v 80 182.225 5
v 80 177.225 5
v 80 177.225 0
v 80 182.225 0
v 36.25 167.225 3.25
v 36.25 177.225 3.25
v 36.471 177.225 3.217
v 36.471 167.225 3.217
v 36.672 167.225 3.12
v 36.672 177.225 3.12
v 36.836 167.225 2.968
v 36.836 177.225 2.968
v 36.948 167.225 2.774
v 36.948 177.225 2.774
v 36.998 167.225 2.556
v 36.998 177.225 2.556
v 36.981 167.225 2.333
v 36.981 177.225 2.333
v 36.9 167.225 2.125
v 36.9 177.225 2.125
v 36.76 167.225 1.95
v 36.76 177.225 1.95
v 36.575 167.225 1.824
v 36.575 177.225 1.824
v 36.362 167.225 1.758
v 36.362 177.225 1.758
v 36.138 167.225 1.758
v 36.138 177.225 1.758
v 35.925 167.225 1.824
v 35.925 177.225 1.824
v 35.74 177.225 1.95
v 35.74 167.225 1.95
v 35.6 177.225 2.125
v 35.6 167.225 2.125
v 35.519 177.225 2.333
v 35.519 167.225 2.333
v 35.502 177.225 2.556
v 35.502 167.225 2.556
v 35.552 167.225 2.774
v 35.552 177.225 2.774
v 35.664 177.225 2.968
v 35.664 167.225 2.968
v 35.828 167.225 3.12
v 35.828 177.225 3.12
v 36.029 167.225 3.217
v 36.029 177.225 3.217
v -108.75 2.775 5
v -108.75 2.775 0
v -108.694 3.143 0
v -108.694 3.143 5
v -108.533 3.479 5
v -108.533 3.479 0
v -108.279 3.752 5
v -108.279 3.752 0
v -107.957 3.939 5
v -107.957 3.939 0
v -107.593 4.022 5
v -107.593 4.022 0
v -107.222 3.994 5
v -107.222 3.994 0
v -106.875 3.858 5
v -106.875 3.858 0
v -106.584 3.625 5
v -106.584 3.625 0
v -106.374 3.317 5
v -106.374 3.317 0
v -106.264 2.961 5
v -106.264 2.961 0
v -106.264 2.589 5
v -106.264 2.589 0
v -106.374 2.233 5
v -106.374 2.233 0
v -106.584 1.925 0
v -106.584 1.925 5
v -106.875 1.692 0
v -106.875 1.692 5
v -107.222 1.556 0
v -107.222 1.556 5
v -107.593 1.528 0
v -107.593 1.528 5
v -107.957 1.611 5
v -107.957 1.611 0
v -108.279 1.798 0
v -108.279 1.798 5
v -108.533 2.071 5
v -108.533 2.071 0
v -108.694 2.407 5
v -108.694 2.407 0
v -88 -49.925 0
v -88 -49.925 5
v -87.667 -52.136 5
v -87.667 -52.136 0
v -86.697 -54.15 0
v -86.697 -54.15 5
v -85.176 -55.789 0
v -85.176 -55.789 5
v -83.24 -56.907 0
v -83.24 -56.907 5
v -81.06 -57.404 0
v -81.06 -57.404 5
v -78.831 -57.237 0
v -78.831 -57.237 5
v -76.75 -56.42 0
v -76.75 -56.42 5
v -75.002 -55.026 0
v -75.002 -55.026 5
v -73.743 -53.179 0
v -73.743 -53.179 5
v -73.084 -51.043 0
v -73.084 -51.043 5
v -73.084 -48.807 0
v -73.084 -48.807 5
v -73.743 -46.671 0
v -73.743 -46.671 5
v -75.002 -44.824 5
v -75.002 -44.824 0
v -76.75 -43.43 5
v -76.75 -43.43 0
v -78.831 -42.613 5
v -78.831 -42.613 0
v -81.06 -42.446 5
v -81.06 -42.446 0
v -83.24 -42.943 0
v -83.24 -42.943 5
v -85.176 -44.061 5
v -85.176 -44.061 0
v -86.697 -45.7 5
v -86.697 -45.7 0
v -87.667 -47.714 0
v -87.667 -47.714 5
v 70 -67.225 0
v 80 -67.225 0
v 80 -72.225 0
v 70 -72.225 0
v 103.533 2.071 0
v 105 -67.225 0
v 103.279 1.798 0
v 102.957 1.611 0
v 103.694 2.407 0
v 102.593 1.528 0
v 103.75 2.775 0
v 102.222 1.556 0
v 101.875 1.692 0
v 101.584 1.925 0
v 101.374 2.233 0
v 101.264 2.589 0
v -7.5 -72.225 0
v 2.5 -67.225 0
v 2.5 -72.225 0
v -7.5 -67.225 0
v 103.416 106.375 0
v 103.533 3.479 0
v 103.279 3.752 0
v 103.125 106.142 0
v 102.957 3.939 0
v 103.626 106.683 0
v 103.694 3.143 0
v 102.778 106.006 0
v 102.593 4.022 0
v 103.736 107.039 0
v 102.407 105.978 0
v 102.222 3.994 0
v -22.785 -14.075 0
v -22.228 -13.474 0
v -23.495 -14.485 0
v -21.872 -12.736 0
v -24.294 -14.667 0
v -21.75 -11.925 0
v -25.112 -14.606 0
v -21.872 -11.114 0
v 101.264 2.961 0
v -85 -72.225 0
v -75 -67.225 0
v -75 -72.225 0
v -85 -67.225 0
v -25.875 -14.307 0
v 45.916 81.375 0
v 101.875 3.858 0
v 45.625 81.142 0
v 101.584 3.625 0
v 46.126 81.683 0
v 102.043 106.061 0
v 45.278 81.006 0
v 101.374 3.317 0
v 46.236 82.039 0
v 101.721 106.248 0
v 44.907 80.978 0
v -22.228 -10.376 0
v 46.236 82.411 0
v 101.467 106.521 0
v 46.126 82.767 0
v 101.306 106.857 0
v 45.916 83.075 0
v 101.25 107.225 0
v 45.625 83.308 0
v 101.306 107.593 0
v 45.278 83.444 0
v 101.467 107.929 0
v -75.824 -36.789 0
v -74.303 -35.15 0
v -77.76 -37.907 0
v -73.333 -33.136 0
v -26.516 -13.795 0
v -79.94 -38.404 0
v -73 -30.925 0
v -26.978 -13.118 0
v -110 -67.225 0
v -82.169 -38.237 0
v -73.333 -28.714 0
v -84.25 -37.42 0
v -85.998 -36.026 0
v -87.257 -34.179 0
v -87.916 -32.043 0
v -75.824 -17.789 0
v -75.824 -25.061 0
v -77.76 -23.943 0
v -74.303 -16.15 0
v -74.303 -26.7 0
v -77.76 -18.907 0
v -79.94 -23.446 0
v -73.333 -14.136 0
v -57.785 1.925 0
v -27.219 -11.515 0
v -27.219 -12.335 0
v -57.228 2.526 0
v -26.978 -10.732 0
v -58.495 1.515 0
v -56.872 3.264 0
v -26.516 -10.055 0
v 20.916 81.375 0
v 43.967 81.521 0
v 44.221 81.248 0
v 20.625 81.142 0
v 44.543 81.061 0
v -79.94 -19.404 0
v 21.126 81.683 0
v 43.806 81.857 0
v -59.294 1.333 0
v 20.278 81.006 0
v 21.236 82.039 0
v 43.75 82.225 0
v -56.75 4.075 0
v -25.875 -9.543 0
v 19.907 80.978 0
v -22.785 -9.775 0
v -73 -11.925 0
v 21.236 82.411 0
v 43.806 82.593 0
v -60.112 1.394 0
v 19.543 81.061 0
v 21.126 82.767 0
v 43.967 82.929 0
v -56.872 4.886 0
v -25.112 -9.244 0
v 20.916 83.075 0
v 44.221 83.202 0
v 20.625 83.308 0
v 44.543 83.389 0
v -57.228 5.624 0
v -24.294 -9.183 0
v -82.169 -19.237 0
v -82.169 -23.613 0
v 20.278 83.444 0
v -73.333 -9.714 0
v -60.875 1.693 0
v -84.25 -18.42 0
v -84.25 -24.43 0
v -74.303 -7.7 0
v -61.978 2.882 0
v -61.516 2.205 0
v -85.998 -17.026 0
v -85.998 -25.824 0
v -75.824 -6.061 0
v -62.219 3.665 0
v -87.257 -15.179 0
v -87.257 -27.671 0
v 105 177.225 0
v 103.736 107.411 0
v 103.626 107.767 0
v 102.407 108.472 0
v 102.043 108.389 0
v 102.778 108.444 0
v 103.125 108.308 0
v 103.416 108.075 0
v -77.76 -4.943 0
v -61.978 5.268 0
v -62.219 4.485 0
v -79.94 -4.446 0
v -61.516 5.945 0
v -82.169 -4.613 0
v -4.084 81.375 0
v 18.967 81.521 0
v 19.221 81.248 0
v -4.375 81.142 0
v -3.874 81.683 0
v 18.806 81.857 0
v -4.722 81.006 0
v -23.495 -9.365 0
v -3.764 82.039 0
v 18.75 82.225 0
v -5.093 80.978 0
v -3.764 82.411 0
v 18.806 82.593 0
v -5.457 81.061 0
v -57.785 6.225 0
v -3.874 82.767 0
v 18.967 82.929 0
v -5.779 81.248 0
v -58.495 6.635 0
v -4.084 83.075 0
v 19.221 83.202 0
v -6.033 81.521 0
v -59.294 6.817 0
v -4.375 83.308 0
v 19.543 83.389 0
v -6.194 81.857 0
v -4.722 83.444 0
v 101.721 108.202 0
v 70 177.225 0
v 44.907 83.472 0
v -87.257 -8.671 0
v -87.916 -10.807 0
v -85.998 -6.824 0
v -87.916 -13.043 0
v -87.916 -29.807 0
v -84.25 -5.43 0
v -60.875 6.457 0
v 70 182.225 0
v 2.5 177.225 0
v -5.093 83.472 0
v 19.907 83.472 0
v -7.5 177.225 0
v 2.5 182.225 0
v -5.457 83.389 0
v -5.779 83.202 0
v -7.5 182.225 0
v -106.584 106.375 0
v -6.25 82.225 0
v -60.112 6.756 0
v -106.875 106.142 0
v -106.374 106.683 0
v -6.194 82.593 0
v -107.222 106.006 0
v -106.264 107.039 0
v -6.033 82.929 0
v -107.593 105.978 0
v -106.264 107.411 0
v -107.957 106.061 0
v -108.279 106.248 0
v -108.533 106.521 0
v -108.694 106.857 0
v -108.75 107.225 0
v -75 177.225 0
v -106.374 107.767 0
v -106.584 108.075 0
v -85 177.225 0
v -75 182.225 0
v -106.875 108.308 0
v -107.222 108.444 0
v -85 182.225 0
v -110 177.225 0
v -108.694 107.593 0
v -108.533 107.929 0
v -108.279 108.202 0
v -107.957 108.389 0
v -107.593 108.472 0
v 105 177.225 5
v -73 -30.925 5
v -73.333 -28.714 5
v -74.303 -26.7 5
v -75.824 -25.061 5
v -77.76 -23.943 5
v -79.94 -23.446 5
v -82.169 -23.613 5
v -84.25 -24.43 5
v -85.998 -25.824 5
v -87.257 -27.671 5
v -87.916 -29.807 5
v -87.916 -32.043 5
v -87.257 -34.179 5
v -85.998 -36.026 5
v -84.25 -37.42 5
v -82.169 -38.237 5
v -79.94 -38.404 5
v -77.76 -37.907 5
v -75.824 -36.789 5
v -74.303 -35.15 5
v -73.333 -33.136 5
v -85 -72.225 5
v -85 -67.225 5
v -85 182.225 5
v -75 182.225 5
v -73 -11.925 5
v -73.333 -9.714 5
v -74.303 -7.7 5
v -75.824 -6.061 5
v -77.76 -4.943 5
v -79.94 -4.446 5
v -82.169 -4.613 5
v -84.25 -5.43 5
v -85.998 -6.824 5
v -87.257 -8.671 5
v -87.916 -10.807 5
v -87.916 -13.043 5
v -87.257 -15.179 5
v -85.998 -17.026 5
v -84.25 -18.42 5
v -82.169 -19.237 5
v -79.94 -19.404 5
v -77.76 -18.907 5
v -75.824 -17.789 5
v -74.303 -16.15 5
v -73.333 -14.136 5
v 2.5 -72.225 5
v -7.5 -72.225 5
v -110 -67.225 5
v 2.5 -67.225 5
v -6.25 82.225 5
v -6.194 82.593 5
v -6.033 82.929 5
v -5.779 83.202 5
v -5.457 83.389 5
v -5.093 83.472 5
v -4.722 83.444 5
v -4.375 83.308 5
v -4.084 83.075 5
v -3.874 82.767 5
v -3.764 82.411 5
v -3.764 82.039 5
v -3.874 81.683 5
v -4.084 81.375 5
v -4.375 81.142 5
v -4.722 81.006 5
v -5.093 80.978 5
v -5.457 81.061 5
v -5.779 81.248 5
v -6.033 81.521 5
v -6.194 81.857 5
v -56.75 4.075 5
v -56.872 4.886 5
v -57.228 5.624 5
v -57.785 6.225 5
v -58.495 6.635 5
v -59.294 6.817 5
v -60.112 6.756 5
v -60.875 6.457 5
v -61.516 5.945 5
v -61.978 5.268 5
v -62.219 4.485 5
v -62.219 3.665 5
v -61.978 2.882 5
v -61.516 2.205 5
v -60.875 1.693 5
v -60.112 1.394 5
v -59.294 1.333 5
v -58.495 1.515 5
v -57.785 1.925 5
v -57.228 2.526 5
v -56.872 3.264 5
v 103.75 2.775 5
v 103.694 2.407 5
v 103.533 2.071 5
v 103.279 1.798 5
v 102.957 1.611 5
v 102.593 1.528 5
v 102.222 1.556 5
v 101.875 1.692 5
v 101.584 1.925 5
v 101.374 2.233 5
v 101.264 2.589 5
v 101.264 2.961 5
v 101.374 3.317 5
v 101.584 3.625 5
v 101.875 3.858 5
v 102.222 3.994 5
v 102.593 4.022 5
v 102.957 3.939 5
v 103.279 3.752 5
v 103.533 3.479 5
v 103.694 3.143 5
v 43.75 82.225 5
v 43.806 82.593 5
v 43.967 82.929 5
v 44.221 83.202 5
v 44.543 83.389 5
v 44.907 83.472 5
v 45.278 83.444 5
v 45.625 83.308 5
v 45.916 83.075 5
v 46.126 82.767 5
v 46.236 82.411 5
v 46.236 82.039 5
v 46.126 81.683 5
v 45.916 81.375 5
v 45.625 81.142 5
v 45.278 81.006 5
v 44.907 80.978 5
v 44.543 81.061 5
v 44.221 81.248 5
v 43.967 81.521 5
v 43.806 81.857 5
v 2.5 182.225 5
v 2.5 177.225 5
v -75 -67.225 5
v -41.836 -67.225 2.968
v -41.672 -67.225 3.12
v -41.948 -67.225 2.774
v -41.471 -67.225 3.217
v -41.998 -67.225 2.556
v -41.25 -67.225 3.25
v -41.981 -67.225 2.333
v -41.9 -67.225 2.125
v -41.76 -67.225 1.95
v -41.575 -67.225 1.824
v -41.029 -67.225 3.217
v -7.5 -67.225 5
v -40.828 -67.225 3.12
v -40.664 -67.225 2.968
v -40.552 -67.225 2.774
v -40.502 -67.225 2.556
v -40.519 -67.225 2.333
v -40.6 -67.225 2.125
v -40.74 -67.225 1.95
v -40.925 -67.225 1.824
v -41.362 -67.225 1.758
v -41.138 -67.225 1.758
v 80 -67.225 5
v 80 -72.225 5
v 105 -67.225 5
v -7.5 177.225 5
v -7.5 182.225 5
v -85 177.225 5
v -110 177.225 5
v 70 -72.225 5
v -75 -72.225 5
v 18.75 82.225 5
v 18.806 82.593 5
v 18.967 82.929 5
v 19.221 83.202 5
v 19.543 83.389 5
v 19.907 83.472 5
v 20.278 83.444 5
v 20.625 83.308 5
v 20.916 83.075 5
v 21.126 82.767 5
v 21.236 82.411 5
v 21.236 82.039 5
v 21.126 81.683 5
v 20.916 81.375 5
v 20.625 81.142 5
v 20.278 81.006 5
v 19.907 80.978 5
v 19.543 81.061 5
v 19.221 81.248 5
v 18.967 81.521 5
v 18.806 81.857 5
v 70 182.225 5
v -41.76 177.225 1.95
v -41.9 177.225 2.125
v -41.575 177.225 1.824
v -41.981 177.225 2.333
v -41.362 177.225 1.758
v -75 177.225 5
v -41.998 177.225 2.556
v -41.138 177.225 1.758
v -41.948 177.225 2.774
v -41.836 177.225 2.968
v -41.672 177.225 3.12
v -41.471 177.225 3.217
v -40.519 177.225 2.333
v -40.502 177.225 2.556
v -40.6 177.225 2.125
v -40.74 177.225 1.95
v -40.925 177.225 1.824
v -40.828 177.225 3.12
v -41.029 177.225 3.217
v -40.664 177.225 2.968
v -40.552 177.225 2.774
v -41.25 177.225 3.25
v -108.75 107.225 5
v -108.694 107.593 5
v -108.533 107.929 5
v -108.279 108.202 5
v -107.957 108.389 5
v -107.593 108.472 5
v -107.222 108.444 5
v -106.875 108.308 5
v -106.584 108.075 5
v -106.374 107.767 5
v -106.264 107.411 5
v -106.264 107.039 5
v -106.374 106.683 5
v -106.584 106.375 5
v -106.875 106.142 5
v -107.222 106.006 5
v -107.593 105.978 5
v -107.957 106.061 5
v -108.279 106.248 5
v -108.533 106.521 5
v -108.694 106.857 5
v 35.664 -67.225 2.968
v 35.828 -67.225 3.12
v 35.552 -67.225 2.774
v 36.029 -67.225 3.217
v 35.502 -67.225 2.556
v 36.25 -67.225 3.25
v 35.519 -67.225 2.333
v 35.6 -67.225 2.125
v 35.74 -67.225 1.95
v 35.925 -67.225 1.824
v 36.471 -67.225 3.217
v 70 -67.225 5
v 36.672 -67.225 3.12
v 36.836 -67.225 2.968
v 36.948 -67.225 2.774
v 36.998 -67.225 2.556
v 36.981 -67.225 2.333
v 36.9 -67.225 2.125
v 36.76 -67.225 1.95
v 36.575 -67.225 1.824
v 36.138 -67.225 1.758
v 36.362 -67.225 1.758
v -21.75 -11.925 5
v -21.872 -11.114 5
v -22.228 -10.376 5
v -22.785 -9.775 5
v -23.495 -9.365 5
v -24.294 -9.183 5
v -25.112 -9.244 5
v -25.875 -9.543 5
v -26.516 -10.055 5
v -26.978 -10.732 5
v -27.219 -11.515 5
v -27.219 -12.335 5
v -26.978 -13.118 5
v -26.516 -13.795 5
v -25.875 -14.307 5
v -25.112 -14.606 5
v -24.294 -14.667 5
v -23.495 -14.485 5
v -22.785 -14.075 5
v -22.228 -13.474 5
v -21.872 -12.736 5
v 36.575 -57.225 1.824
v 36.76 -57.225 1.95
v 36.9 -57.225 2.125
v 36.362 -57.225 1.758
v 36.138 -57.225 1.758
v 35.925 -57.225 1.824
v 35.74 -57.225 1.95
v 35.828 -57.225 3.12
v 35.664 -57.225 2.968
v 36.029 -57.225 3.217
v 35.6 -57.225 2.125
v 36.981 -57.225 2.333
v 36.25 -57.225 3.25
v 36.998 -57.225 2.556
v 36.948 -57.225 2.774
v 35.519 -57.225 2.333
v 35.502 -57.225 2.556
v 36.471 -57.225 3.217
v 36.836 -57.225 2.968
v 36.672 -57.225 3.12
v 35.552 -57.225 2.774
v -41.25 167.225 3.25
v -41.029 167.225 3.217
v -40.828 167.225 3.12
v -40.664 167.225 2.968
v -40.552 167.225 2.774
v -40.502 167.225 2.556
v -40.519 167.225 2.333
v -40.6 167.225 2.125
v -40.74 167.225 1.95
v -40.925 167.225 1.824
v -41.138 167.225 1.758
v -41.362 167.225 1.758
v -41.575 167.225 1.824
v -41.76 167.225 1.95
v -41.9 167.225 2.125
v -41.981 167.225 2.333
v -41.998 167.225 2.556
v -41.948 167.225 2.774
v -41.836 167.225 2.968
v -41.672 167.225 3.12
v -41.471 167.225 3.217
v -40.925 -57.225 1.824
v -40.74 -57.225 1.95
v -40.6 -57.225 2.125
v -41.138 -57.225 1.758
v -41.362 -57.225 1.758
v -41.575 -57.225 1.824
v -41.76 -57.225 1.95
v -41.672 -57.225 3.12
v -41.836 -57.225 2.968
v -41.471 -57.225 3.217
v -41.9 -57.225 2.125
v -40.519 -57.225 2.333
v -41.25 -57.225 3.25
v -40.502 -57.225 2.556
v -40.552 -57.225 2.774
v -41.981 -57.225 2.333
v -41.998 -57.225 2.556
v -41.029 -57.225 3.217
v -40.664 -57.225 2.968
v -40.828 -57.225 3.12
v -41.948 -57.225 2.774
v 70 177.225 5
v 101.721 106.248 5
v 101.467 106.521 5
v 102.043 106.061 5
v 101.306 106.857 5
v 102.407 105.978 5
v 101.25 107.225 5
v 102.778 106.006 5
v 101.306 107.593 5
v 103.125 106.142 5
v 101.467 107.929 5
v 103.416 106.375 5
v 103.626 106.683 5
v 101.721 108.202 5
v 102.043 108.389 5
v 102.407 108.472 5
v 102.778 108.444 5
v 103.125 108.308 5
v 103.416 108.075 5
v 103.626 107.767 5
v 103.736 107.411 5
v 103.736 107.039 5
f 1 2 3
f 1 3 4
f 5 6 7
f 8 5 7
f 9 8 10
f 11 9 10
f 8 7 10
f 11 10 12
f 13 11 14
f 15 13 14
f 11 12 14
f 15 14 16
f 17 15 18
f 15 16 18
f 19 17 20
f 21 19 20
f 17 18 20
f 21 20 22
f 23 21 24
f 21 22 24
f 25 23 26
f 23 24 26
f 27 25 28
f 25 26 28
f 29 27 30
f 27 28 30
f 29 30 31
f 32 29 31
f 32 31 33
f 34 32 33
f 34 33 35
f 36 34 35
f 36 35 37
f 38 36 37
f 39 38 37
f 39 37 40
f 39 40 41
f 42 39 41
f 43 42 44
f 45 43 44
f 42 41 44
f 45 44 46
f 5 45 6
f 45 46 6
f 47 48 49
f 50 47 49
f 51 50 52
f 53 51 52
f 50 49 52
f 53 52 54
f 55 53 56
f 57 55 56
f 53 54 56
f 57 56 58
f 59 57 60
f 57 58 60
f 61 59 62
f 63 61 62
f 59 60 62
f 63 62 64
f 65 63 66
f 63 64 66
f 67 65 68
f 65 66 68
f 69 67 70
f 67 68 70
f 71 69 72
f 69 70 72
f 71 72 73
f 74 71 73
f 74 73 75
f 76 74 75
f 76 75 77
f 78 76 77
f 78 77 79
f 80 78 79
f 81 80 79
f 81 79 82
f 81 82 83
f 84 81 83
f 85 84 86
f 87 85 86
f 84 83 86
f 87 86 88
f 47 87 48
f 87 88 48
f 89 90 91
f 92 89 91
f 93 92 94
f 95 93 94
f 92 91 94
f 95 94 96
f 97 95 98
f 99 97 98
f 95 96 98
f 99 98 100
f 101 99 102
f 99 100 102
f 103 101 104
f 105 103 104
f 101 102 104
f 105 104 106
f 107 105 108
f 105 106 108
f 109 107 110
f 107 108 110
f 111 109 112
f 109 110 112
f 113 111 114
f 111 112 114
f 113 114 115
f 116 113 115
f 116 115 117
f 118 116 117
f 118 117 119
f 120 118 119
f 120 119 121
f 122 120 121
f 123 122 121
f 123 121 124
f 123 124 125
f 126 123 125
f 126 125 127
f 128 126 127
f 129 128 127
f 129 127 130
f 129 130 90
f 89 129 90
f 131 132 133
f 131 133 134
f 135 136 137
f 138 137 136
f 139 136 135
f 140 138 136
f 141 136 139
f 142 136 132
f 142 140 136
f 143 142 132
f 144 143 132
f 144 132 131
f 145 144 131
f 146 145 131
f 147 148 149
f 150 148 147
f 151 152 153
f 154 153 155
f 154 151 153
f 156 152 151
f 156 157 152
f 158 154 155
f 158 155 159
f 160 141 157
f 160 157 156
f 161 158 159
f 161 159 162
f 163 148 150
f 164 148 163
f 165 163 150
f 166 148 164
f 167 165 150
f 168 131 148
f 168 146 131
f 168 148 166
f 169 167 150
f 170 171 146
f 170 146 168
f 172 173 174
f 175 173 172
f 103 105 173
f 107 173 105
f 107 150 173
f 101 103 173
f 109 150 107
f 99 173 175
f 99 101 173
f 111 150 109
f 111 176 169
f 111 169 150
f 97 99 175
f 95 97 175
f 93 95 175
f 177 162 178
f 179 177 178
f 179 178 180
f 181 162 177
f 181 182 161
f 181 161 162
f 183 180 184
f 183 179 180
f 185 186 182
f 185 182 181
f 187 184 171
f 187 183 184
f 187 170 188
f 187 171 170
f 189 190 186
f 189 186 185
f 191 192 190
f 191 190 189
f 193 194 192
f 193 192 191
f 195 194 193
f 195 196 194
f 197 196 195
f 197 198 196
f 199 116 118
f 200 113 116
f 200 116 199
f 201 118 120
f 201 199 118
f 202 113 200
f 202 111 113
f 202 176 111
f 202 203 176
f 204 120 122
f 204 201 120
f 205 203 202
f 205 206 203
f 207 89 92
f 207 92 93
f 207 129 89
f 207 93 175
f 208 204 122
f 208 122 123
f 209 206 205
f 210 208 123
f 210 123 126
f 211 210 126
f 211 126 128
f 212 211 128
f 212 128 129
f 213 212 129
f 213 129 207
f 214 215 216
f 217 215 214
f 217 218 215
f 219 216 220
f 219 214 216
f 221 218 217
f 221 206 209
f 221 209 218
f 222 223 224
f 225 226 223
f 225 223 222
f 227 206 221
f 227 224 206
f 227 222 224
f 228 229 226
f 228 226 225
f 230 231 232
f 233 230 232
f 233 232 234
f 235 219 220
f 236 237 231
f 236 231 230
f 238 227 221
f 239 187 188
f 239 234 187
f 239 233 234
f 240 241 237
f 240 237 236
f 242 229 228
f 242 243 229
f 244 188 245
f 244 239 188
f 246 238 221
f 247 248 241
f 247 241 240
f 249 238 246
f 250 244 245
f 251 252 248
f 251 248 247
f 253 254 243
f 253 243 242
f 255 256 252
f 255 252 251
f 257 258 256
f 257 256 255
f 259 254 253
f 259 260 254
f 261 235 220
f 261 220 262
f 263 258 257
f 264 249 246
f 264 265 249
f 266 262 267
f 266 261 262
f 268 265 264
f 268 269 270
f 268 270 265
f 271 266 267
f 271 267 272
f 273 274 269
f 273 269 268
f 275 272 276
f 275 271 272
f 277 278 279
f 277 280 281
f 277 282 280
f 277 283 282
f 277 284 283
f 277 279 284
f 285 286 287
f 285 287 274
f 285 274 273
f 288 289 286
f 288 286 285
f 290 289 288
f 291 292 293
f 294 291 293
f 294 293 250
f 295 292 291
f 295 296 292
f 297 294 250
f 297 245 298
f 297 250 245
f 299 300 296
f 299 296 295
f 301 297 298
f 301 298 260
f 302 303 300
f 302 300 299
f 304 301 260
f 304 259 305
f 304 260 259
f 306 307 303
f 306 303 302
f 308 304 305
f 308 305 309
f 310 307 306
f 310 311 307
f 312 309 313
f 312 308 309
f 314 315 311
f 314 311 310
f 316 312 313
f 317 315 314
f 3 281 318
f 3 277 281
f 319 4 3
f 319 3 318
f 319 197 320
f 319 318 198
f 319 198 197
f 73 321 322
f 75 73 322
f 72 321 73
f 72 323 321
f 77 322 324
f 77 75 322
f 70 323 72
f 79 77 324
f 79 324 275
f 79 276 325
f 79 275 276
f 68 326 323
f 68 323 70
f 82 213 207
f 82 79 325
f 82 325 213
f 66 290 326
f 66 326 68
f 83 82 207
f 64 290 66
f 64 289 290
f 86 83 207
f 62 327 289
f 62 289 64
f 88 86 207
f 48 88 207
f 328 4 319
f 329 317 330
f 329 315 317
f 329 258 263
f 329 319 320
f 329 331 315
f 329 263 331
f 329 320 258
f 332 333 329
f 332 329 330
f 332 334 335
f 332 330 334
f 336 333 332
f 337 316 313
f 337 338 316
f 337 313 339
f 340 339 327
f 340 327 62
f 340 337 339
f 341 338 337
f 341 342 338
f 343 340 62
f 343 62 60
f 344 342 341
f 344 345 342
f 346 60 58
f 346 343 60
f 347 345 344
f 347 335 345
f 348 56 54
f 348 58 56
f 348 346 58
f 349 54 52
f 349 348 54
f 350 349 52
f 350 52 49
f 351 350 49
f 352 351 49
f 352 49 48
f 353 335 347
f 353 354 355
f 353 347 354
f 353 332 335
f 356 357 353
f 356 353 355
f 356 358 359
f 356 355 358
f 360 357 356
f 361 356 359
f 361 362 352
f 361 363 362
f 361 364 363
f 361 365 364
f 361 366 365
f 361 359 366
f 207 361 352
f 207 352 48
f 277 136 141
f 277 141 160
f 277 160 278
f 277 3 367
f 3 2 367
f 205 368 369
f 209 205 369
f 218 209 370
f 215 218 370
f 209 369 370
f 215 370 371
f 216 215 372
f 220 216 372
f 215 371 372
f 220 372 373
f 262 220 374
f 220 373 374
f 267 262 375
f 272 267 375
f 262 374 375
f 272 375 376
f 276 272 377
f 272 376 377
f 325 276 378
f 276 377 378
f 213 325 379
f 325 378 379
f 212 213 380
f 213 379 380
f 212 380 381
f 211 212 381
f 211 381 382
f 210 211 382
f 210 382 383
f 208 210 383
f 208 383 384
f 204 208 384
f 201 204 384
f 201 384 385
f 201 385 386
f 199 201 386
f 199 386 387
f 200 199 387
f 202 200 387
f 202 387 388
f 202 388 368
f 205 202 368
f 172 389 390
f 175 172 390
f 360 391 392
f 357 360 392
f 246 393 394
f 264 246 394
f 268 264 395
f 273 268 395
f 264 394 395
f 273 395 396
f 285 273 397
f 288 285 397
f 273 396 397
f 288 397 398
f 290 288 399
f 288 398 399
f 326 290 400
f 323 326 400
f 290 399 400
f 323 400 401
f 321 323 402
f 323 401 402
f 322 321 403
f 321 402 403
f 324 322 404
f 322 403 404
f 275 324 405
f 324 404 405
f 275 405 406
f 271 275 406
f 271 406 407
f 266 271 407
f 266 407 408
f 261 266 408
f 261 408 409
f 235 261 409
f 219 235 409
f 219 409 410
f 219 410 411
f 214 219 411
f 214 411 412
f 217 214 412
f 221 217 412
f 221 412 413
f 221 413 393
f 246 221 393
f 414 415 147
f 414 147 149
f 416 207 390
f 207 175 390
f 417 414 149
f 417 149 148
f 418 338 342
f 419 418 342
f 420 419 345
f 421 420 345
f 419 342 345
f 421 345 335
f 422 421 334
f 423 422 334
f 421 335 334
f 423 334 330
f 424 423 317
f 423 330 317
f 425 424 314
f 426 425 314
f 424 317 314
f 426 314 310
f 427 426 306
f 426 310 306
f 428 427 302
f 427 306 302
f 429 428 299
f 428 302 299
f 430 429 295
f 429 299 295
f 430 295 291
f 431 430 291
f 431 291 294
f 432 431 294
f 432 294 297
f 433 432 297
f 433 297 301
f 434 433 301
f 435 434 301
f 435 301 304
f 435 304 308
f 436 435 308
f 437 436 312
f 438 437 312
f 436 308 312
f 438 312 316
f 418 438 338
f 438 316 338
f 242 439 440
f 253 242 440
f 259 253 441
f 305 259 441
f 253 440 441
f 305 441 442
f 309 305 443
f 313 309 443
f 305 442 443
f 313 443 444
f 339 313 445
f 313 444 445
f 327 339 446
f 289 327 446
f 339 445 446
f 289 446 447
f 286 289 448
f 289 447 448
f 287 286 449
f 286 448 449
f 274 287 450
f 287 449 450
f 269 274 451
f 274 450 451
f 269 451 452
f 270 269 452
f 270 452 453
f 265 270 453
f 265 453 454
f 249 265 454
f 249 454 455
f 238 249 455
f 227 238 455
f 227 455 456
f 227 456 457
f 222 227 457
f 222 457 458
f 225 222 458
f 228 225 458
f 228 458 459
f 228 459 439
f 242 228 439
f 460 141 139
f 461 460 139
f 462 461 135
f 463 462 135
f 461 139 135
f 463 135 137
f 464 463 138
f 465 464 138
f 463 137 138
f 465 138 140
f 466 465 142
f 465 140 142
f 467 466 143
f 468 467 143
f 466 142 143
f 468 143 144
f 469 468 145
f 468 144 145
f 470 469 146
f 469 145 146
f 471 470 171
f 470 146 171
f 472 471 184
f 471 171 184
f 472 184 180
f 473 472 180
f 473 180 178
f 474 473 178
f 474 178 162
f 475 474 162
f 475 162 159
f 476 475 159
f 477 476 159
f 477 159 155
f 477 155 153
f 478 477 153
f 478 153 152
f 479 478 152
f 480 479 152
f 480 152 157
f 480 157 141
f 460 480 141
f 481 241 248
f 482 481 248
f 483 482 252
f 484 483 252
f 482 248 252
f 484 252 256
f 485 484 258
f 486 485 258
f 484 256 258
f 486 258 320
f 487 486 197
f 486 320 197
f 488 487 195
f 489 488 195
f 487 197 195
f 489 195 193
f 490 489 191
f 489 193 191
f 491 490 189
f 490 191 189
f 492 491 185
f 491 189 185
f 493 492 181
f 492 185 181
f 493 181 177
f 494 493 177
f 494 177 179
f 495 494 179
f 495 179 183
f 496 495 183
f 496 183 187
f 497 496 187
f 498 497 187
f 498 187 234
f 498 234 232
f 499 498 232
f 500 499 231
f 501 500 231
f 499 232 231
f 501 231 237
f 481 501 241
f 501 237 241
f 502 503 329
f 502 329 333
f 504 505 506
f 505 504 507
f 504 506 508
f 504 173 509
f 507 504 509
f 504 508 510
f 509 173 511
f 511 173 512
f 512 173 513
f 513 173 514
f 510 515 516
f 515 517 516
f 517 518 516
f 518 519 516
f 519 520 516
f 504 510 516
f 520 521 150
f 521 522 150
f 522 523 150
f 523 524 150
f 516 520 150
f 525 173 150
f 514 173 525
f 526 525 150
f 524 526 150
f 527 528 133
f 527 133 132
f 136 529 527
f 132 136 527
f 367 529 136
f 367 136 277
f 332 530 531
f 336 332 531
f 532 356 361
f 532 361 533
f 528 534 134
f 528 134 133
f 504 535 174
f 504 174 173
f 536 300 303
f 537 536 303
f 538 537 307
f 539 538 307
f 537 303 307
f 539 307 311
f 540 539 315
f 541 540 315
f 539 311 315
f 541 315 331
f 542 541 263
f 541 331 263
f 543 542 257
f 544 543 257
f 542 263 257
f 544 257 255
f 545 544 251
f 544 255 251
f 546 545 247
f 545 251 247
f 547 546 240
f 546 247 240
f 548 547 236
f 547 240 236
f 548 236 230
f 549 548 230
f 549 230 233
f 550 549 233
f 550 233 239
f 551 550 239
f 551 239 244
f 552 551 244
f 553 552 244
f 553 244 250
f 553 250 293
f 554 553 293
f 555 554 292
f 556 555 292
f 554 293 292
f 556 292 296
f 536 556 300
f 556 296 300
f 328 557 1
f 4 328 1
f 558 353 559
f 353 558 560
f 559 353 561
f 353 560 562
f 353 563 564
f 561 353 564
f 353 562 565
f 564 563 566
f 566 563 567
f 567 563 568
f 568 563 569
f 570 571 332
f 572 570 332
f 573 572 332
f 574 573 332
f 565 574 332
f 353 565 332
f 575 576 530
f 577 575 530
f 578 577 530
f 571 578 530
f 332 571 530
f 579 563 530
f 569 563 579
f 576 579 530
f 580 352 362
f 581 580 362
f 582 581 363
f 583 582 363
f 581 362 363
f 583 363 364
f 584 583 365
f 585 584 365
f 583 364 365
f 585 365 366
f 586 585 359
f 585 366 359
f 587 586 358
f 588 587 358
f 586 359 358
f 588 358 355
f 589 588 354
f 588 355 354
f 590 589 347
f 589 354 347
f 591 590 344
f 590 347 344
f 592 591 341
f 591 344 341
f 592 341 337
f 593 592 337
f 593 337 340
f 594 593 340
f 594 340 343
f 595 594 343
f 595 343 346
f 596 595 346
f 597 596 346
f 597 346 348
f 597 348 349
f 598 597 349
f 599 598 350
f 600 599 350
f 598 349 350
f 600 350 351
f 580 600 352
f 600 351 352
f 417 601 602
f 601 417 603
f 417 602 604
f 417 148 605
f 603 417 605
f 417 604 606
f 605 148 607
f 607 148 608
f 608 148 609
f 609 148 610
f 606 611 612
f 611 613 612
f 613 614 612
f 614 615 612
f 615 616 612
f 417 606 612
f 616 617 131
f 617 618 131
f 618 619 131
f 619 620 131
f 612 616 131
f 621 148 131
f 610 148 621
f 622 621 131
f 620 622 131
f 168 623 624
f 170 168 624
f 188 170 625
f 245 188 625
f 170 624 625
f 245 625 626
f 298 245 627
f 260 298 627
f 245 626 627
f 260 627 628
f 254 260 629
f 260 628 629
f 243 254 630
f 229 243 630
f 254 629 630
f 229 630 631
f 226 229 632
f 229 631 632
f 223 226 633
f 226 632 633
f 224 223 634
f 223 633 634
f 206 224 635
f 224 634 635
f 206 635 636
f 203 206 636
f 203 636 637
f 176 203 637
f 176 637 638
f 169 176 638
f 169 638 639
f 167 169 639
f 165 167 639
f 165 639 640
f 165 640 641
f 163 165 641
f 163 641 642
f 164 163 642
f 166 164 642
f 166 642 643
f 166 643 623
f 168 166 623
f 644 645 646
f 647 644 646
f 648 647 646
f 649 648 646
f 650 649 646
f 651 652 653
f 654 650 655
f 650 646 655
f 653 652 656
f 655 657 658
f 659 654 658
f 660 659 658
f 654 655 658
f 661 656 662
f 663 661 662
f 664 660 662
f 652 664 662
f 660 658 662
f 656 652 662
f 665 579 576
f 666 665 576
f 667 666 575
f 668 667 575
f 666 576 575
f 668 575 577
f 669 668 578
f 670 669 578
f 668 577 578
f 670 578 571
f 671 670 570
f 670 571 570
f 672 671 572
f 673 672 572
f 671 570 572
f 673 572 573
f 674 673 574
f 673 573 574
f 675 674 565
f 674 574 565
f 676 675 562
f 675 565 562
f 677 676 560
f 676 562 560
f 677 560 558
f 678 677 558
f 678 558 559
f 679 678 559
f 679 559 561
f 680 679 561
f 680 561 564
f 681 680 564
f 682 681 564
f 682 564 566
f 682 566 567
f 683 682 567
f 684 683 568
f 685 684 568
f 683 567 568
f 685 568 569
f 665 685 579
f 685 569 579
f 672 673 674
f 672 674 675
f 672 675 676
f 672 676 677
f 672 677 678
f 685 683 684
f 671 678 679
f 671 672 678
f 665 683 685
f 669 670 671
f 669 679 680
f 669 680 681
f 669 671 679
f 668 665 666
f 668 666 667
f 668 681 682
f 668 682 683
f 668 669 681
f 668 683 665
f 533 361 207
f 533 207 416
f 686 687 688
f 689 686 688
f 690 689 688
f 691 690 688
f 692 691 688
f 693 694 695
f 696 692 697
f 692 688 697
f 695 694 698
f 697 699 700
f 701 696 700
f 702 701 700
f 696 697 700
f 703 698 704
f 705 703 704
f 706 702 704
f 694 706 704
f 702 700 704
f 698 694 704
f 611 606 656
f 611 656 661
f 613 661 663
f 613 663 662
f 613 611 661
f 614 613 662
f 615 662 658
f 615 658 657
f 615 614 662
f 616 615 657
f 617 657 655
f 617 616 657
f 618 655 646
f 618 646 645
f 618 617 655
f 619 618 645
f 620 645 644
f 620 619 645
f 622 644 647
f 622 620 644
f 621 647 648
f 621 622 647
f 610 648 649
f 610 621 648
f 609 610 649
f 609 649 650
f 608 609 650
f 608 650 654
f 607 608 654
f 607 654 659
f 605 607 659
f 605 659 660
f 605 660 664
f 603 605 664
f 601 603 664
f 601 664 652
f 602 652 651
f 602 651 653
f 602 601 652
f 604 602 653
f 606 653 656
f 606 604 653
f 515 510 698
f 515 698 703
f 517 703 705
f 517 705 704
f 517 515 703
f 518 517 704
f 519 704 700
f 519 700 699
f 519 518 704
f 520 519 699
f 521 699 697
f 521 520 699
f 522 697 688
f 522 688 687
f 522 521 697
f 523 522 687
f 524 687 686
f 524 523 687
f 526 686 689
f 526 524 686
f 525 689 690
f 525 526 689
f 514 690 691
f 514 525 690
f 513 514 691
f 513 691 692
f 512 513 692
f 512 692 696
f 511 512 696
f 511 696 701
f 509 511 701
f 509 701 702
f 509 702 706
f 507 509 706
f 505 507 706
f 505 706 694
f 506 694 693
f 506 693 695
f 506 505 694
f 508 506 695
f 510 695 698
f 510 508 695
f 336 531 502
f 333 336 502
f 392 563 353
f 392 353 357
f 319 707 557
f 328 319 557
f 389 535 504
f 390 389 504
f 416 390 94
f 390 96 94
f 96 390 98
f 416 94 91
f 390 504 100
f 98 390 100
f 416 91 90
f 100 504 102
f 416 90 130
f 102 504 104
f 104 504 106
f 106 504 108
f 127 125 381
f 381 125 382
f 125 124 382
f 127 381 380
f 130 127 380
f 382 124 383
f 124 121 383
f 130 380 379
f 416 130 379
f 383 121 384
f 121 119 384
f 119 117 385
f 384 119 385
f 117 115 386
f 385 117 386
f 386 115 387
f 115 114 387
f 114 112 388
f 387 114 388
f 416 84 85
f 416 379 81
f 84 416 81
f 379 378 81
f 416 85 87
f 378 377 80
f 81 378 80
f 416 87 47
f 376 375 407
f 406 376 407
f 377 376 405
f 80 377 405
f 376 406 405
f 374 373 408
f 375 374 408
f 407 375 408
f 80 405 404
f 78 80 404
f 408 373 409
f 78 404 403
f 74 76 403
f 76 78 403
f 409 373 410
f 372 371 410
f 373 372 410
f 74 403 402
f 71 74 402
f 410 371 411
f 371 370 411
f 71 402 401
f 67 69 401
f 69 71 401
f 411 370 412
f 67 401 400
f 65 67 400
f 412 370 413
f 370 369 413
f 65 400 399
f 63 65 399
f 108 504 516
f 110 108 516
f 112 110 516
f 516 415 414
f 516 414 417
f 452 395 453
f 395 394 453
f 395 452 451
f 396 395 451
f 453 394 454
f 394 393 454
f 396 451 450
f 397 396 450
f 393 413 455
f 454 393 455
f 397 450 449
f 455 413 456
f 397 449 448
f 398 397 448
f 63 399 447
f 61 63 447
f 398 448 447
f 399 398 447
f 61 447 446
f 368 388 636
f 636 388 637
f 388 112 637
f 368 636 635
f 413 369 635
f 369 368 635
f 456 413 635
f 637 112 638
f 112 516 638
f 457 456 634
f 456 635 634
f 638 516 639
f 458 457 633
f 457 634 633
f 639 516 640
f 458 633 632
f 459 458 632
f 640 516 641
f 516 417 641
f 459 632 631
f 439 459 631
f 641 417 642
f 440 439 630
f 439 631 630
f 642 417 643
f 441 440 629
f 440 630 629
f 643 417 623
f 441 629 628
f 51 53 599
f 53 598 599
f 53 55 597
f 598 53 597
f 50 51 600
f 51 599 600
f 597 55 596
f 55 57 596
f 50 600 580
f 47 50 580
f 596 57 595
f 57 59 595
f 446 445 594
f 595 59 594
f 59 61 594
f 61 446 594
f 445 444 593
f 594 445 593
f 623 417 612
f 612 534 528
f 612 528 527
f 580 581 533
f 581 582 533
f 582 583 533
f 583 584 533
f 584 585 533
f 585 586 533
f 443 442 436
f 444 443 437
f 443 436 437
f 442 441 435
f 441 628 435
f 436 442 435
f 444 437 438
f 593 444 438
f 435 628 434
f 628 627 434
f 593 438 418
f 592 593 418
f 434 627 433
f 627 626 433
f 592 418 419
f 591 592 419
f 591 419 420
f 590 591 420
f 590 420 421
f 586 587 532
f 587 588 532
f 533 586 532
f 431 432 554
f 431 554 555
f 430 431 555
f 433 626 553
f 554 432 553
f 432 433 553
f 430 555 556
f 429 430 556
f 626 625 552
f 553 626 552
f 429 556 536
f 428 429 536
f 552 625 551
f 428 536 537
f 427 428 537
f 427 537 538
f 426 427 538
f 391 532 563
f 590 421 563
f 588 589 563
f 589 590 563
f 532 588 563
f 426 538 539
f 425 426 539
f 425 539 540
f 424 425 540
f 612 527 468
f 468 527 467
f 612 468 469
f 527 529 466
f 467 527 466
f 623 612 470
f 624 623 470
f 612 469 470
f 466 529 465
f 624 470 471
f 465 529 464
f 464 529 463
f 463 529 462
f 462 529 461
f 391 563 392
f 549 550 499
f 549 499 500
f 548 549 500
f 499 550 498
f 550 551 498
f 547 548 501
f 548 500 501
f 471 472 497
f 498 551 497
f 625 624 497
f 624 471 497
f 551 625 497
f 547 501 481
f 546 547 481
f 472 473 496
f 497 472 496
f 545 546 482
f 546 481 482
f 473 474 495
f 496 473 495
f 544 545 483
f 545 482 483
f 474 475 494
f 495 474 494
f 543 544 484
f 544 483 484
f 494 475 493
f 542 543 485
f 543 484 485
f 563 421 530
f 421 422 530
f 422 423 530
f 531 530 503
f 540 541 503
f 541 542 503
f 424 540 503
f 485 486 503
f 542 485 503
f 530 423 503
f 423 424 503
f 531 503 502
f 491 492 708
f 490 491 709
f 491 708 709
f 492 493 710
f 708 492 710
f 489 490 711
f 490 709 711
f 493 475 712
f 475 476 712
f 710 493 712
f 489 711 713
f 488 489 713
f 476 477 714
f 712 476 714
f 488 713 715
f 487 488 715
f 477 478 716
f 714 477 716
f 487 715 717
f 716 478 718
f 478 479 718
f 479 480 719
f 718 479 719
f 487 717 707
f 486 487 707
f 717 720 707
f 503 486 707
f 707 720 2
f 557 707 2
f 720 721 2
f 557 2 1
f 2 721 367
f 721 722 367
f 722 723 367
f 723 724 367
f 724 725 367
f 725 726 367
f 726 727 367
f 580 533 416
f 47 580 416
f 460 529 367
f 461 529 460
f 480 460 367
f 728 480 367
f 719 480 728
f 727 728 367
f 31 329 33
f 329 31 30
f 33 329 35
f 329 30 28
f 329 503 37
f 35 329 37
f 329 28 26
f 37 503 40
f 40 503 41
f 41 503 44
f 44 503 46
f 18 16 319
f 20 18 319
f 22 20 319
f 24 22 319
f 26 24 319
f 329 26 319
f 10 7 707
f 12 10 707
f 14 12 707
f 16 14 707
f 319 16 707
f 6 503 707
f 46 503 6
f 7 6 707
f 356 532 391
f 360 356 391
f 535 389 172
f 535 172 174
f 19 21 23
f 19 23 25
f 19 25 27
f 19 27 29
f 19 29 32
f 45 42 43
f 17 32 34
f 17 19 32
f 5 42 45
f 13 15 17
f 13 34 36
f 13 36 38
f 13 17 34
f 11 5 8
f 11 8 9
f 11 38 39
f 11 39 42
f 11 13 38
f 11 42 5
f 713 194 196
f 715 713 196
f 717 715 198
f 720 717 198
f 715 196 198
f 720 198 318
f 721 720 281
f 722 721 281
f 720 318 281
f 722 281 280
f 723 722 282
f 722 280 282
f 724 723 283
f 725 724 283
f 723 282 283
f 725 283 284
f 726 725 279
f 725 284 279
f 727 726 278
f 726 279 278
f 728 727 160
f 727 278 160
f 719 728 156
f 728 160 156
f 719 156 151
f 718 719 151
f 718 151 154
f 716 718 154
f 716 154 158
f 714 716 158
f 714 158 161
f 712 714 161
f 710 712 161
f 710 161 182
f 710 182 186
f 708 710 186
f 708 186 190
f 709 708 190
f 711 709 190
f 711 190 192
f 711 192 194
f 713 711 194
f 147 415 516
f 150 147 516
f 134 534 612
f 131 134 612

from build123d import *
from build123d.topology import SkipClean

# Parameters (mm, degrees)
SKIZZE1_W                       = 5
SKIZZE1_H                       = 5
SKIZZE1_W_2                     = 15
AUFSATZ_LINEAR_AUSTRAGEN1_DEPTH = 5
SKIZZE2_R                       = 2.75
SCHNITT_LINEAR_AUSTRAGEN1_DEPTH = 128.539996178
SCHNITT_LINEAR_AUSTRAGEN2_DEPTH = 128.539996178
SKIZZE4_R                       = 7.5
SCHNITT_LINEAR_AUSTRAGEN3_DEPTH = 128.539996178
SKIZZE5_R                       = 0.75
SKIZZE5_R_2                     = 6
SENSORS_DEPTH                   = 128.539996178
AUFSATZ_LINEAR_AUSTRAGEN2_DEPTH = 5
SKIZZE7_R                       = 1.25
SCHNITT_LINEAR_AUSTRAGEN5_DEPTH = 239.81729549
SKETCH1_W                       = 69.5
SKETCH1_H                       = 110
BOSS_EXTRUDE1_DEPTH             = 5
SKIZZE9_R                       = 0.75
SKIZZE9_R_2                     = 6
DISCRETECHANNEL_DEPTH           = 239.81729549
SKIZZE10_R                      = 0.75
SKIZZE10_R_2                    = 6
CONTCHANNEL_DEPTH               = 239.81729549
BOSS_EXTRUDE2_DEPTH             = 5
SKIZZE8_R                       = 0.75
SKIZZE8_R_2                     = 7.5
STEPDOWNCONVERTER_DEPTH         = 239.81729549
SKETCH3_R                       = 0.75
SKETCH3_R_2                     = 5
BBB_DEPTH                       = 5
BOSS_EXTRUDE3_DEPTH             = 5
SKETCH5_W                       = 55
SKETCH5_H                       = 244.45
CUT_EXTRUDE2_DEPTH              = 5
SKETCH6_R                       = 5
CUT_EXTRUDE3_DEPTH              = 5
SKETCH7_W                       = 5
SKETCH7_H                       = 10
BOSS_EXTRUDE4_DEPTH             = 5
SKETCH8_W                       = 10
SKETCH8_H                       = 5
BOSS_EXTRUDE5_DEPTH             = 5
BOSS_EXTRUDE6_START             = -5
SKETCH9_W                       = 210
SKETCH9_H                       = 244.45
SKETCH9_R                       = 2.75
SKETCH9_R_2                     = 7.5
BOSS_EXTRUDE6_DEPTH             = 5
SKETCH10_R                      = 1.25
CUT_EXTRUDE4_DEPTH              = 5
SKETCH11_R                      = 1.25
CUT_EXTRUDE5_DEPTH              = 211.370983325
SKETCH12_R                      = 0.75
CUT_EXTRUDE6_DEPTH              = 10
SKETCH13_W                      = 5
SKETCH13_H                      = 244.45
BOSS_EXTRUDE7_DEPTH             = 5
SKETCH14_R                      = 1.25
CUT_EXTRUDE7_DEPTH              = 5
SKETCH15_R                      = 1.25
BOSS_EXTRUDE8_DEPTH             = 5


with BuildPart() as part:
    # Skizze1 → Aufsatz-Linear austragen1 (new body)
    with BuildSketch(Plane.XY):
        Polygon((55, 67.225), (75, 67.225), (75, 72.225), (85, 72.225), (85, 67.225), (100, 67.225), (100, 47.225), (105, 47.225), (105, 37.225), (100, 37.225), (100, -37.225), (105, -37.225), (105, -47.225), (100, -47.225), (100, -67.225), (-100, -67.225), (-100, -47.225), (-105, -47.225), (-105, -37.225), (-100, -37.225), (-100, 37.225), (-105, 37.225), (-105, 47.225), (-100, 47.225), (-100, 67.225), (-85, 67.225), (-85, 72.225), (-75, 72.225), (-75, 67.225), (45, 67.225), (45, 72.225), (55, 72.225), align=None)
        with Locations((13, -40.055)):
            Rectangle(SKIZZE1_W, SKIZZE1_H, mode=Mode.SUBTRACT)
        with Locations((53, -40.055)):
            Rectangle(SKIZZE1_W, SKIZZE1_H, mode=Mode.SUBTRACT)
        with Locations((33, -40.055)):
            Rectangle(SKIZZE1_W_2, SKIZZE1_H, mode=Mode.SUBTRACT)
    extrude(amount=AUFSATZ_LINEAR_AUSTRAGEN1_DEPTH)

    # Skizze2 → Schnitt-Linear austragen1 (cut, through all)
    with BuildSketch(Plane.XY.offset(5)):
        with Locations((-59.5, 4.075)):
            Circle(SKIZZE2_R)
        with Locations((-24.5, -11.925)):
            Circle(SKIZZE2_R)
    extrude(amount=-SCHNITT_LINEAR_AUSTRAGEN1_DEPTH, mode=Mode.SUBTRACT)

    # Skizze3 → Schnitt-Linear austragen2 (cut, through all)
    with BuildSketch(Plane.XY.offset(5)):
        with BuildLine():
            Line((25, -17.555), (41, -17.555))
            ThreePointArc((41, -17.555), (42.414213562, -18.140786438), (43, -19.555))
            Line((43, -19.555), (43, -35.555))
            ThreePointArc((43, -35.555), (42.414213562, -36.969213562), (41, -37.555))
            Line((41, -37.555), (37, -37.555))
            Line((37, -37.555), (29, -37.555))
            Line((29, -37.555), (25, -37.555))
            ThreePointArc((25, -37.555), (23.585786438, -36.969213562), (23, -35.555))
            Line((23, -35.555), (23, -19.555))
            ThreePointArc((23, -19.555), (23.585786438, -18.140786438), (25, -17.555))
        make_face()
        with BuildLine():
            Line((-66.5, 54.225), (-66.5, 35.225))
            ThreePointArc((-66.5, 35.225), (-67.378679656, 33.103679656), (-69.5, 32.225))
            Line((-69.5, 32.225), (-88.5, 32.225))
            ThreePointArc((-88.5, 32.225), (-90.621320344, 33.103679656), (-91.5, 35.225))
            Line((-91.5, 35.225), (-91.5, 54.225))
            ThreePointArc((-91.5, 54.225), (-90.621320344, 56.346320344), (-88.5, 57.225))
            Line((-88.5, 57.225), (-69.5, 57.225))
            ThreePointArc((-69.5, 57.225), (-67.378679656, 56.346320344), (-66.5, 54.225))
        make_face()
        with BuildLine():
            Line((4.5, 57.225), (-14.5, 57.225))
            ThreePointArc((-14.5, 57.225), (-16.621320344, 56.346320344), (-17.5, 54.225))
            Line((-17.5, 54.225), (-17.5, 35.225))
            ThreePointArc((-17.5, 35.225), (-16.621320344, 33.103679656), (-14.5, 32.225))
            Line((-14.5, 32.225), (4.5, 32.225))
            ThreePointArc((4.5, 32.225), (6.621320344, 33.103679656), (7.5, 35.225))
            Line((7.5, 35.225), (7.5, 54.225))
            ThreePointArc((7.5, 54.225), (6.621320344, 56.346320344), (4.5, 57.225))
        make_face()
    extrude(amount=-SCHNITT_LINEAR_AUSTRAGEN2_DEPTH, mode=Mode.SUBTRACT)

    # Skizze4 → Schnitt-Linear austragen3 (cut, through all)
    with BuildSketch(Plane.XY.offset(5)):
        with Locations((-80.5, -30.925)):
            Circle(SKIZZE4_R)
        with Locations((-80.5, -11.925)):
            Circle(SKIZZE4_R)
        with Locations(Location((-80.5, -49.925, 0), (0, 0, 180))):
            Circle(SKIZZE4_R)
    extrude(amount=-SCHNITT_LINEAR_AUSTRAGEN3_DEPTH, mode=Mode.SUBTRACT)

    # Skizze5 → Sensors (cut, through all)
    with BuildSketch(Plane.XY.offset(5)):
        with Locations((-8, -45.225)):
            Circle(SKIZZE5_R)
        with Locations((-8, -3.225)):
            Circle(SKIZZE5_R)
        with Locations((83, -12.225)):
            Circle(SKIZZE5_R)
        with Locations((-15, -56.225)):
            Circle(SKIZZE5_R_2)
        with Locations((0, -56.225)):
            Circle(SKIZZE5_R_2)
        with Locations((15, -56.225)):
            Circle(SKIZZE5_R_2)
        with Locations((30, -56.225)):
            Circle(SKIZZE5_R_2)
        with Locations((45, -56.225)):
            Circle(SKIZZE5_R_2)
        with Locations((60, -56.225)):
            Circle(SKIZZE5_R_2)
        with Locations((75, -56.225)):
            Circle(SKIZZE5_R_2)
        with Locations((90, -56.225)):
            Circle(SKIZZE5_R_2)
    extrude(amount=-SENSORS_DEPTH, mode=Mode.SUBTRACT)

    # Skizze6 → Aufsatz-Linear austragen2 (add)
    with BuildSketch(Plane(origin=(0, 0, 0), x_dir=(-1, 0, 0), z_dir=(0, 0, -1))):
        Polygon((160, 47.225), (160, 37.225), (160, -37.225), (160, -47.225), (160, -67.225), (100, -67.225), (100, 67.225), (-30.5, 67.225), (-30.5, 177.225), (160, 177.225), (160, 67.225), align=None)
    extrude(amount=-AUFSATZ_LINEAR_AUSTRAGEN2_DEPTH)

    # Skizze7 → Schnitt-Linear austragen5 (cut, through all)
    with BuildSketch(Plane(origin=(0, 0, 0), x_dir=(-1, 0, 0), z_dir=(0, 0, -1))):
        with Locations((71.5, 32.775)):
            Circle(SKIZZE7_R)
        with Locations((96.5, 32.775)):
            Circle(SKIZZE7_R)
        with Locations((46.5, 32.775)):
            Circle(SKIZZE7_R)
    extrude(amount=-SCHNITT_LINEAR_AUSTRAGEN5_DEPTH, mode=Mode.SUBTRACT)

    # Sketch1 → Boss-Extrude1 (add)
    with BuildSketch(Plane.XY.offset(5)):
        with Locations((65.25, 122.225)):
            Rectangle(SKETCH1_W, SKETCH1_H)
    extrude(amount=-BOSS_EXTRUDE1_DEPTH)

    # Skizze9 → DiscreteChannel (cut, through all)
    with BuildSketch(Plane.XY.offset(5)):
        with Locations((8, 71.515)):
            Circle(SKIZZE9_R)
        with Locations(Location((69, 71.515, 0), (0, 0, 180))):
            Circle(SKIZZE9_R)
        with Locations(Location((8, 10.515, 0), (0, 0, 180))):
            Circle(SKIZZE9_R)
        with Locations((69, 10.515)):
            Circle(SKIZZE9_R)
        with Locations((-2, 5.015)):
            Circle(SKIZZE9_R_2)
        with Locations((-2, 29.015)):
            Circle(SKIZZE9_R_2)
        with Locations((-2, 53.015)):
            Circle(SKIZZE9_R_2)
        with Locations((-2, 77.015)):
            Circle(SKIZZE9_R_2)
    extrude(amount=-DISCRETECHANNEL_DEPTH, mode=Mode.SUBTRACT)

    # Skizze10 → ContChannel (cut, through all)
    with BuildSketch(Plane.XY.offset(5)):
        with Locations((-4, 136.225)):
            Circle(SKIZZE10_R)
        with Locations(Location((-4, 94.225, 0), (0, 0, 180))):
            Circle(SKIZZE10_R)
        with Locations(Location((-96, 136.225, 0), (0, 0, 180))):
            Circle(SKIZZE10_R)
        with Locations((-96, 94.225)):
            Circle(SKIZZE10_R)
        with Locations((-72.499999267, 166.225)):
            Circle(SKIZZE10_R_2)
        with Locations((-57.499999267, 166.225)):
            Circle(SKIZZE10_R_2)
        with Locations((-42.499999267, 166.225)):
            Circle(SKIZZE10_R_2)
        with Locations((-27.499999267, 166.225)):
            Circle(SKIZZE10_R_2)
        with Locations((-27.499999267, 151.225)):
            Circle(SKIZZE10_R_2)
        with Locations((-42.499999267, 151.225)):
            Circle(SKIZZE10_R_2)
        with Locations((-57.499999267, 151.225)):
            Circle(SKIZZE10_R_2)
        with Locations((-72.499999267, 151.225)):
            Circle(SKIZZE10_R_2)
    extrude(amount=-CONTCHANNEL_DEPTH, mode=Mode.SUBTRACT)

    # Sketch2 → Boss-Extrude2 (add)
    with SkipClean():  # the faces are left unmerged after this step: merging them gives an invalid solid
        with BuildSketch(Plane.XY.offset(5)):
            with BuildLine():
                Line((-14.5, 32.225), (-7.069112348, 32.225))
                ThreePointArc((-7.069112348, 32.225), (-2, 35.015), (3.069112348, 32.225))
                Line((3.069112348, 32.225), (4.5, 32.225))
                ThreePointArc((4.5, 32.225), (6.621320344, 33.103679656), (7.5, 35.225))
                Line((7.5, 35.225), (7.5, 54.225))
                ThreePointArc((7.5, 54.225), (6.621320344, 56.346320344), (4.5, 57.225))
                Line((4.5, 57.225), (2.275032164, 57.225))
                ThreePointArc((2.275032164, 57.225), (-2, 47.015), (-6.275032164, 57.225))
                Line((-6.275032164, 57.225), (-14.5, 57.225))
                ThreePointArc((-14.5, 57.225), (-16.621320344, 56.346320344), (-17.5, 54.225))
                Line((-17.5, 54.225), (-17.5, 35.225))
                ThreePointArc((-17.5, 35.225), (-16.621320344, 33.103679656), (-14.5, 32.225))
            make_face()
        extrude(amount=-BOSS_EXTRUDE2_DEPTH)

    # Skizze8 → StepDownConverter (cut, through all)
    with SkipClean():  # the faces are left unmerged after this step: merging them gives an invalid solid
        with BuildSketch(Plane.XY.offset(5)):
            with Locations((62.5, 153.225)):
                Circle(SKIZZE8_R)
            with Locations(Location((93.5, 153.225, 0), (0, 0, 180))):
                Circle(SKIZZE8_R)
            with Locations(Location((62.5, 100.225, 0), (0, 0, 180))):
                Circle(SKIZZE8_R)
            with Locations((93.5, 100.225)):
                Circle(SKIZZE8_R)
            with Locations((78, 86.225)):
                Circle(SKIZZE8_R_2)
            with Locations(Location((78, 167.225, 0), (0, 0, 180))):
                Circle(SKIZZE8_R_2)
        extrude(amount=-STEPDOWNCONVERTER_DEPTH, mode=Mode.SUBTRACT)

    # Sketch3 → BBB (cut)
    with SkipClean():  # the faces are left unmerged after this step: merging them gives an invalid solid
        with BuildSketch(Plane.XY.offset(5)):
            with Locations((21.85, 147.68)):
                Circle(SKETCH3_R)
            with Locations((87.89, 102.59)):
                Circle(SKETCH3_R)
            with Locations(Location((87.89, 150.86, 0), (0, 0, 180))):
                Circle(SKETCH3_R)
            with Locations(Location((21.85, 105.77, 0), (0, 0, 180))):
                Circle(SKETCH3_R)
            with Locations((13, 167.225)):
                Circle(SKETCH3_R_2)
            with Locations((28, 167.225)):
                Circle(SKETCH3_R_2)
            with Locations((43, 167.225)):
                Circle(SKETCH3_R_2)
            with Locations((58, 167.225)):
                Circle(SKETCH3_R_2)
            with Locations(Location((13, 86.225, 0), (0, 0, 180))):
                Circle(SKETCH3_R_2)
        extrude(amount=-BBB_DEPTH, mode=Mode.SUBTRACT)

    # Sketch4 → Boss-Extrude3 (add)
    with SkipClean():  # the faces are left unmerged after this step: merging them gives an invalid solid
        with BuildSketch(Plane.XY.offset(5)):
            with BuildLine():
                Line((-88.5, 32.225), (-72.622497216, 32.225))
                ThreePointArc((-72.622497216, 32.225), (-71.5, 34.025), (-70.377502784, 32.225))
                Line((-70.377502784, 32.225), (-69.5, 32.225))
                ThreePointArc((-69.5, 32.225), (-67.378679656, 33.103679656), (-66.5, 35.225))
                Line((-66.5, 35.225), (-66.5, 54.225))
                ThreePointArc((-66.5, 54.225), (-67.378679656, 56.346320344), (-69.5, 57.225))
                Line((-69.5, 57.225), (-88.5, 57.225))
                ThreePointArc((-88.5, 57.225), (-90.621320344, 56.346320344), (-91.5, 54.225))
                Line((-91.5, 54.225), (-91.5, 35.225))
                ThreePointArc((-91.5, 35.225), (-90.621320344, 33.103679656), (-88.5, 32.225))
            make_face()
        extrude(amount=-BOSS_EXTRUDE3_DEPTH)

    # Sketch5 → Cut-Extrude2 (cut)
    with SkipClean():  # the faces are left unmerged after this step: merging them gives an invalid solid
        with BuildSketch(Plane.XY.offset(5)):
            with Locations((-132.5, 55)):
                Rectangle(SKETCH5_W, SKETCH5_H)
        extrude(amount=-CUT_EXTRUDE2_DEPTH, mode=Mode.SUBTRACT)

    # Sketch6 → Cut-Extrude3 (cut)
    with SkipClean():  # the faces are left unmerged after this step: merging them gives an invalid solid
        with BuildSketch(Plane.XY.offset(5)):
            with Locations((-95, 82.775)):
                Circle(SKETCH6_R)
            with Locations((-80, 82.775)):
                Circle(SKETCH6_R)
            with Locations((-95, -32.225)):
                Circle(SKETCH6_R)
            with Locations((-65, 82.775)):
                Circle(SKETCH6_R)
        extrude(amount=-CUT_EXTRUDE3_DEPTH, mode=Mode.SUBTRACT)

    # Sketch7 → Boss-Extrude4 (add)
    with SkipClean():  # the faces are left unmerged after this step: merging them gives an invalid solid
        with BuildSketch(Plane.XY.offset(5)):
            with Locations((102.5, 152.225)):
                Rectangle(SKETCH7_W, SKETCH7_H)
        extrude(amount=-BOSS_EXTRUDE4_DEPTH)

    # Sketch8 → Boss-Extrude5 (add)
    with SkipClean():  # the faces are left unmerged after this step: merging them gives an invalid solid
        with BuildSketch(Plane.XY.offset(5)):
            with Locations((-80, -69.725)):
                Rectangle(SKETCH8_W, SKETCH8_H)
            with Locations((-2.5, -69.725)):
                Rectangle(SKETCH8_W, SKETCH8_H)
            with Locations((75, -69.725)):
                Rectangle(SKETCH8_W, SKETCH8_H)
            with Locations((75, 179.725)):
                Rectangle(SKETCH8_W, SKETCH8_H)
            with Locations((-2.5, 179.725)):
                Rectangle(SKETCH8_W, SKETCH8_H)
            with Locations((-80, 179.725)):
                Rectangle(SKETCH8_W, SKETCH8_H)
        extrude(amount=-BOSS_EXTRUDE5_DEPTH)

    # Sketch9 → Boss-Extrude6 (add)
    with BuildSketch(Plane(origin=(0, 0, 0), x_dir=(-1, 0, 0), z_dir=(0, 0, -1)).offset(BOSS_EXTRUDE6_START)):
        with Locations((0, 55)):
            Rectangle(SKETCH9_W, SKETCH9_H)
        with Locations(Location((59.5, 4.075, 0), (0, 0, 180))):
            Circle(SKETCH9_R, mode=Mode.SUBTRACT)
        with Locations(Location((24.5, -11.925, 0), (0, 0, 180))):
            Circle(SKETCH9_R, mode=Mode.SUBTRACT)
        with Locations((80.5, -49.925)):
            Circle(SKETCH9_R_2, mode=Mode.SUBTRACT)
        with Locations(Location((80.5, -30.925, 0), (0, 0, 180))):
            Circle(SKETCH9_R_2, mode=Mode.SUBTRACT)
        with Locations(Location((80.5, -11.925, 0), (0, 0, 180))):
            Circle(SKETCH9_R_2, mode=Mode.SUBTRACT)
    extrude(amount=BOSS_EXTRUDE6_DEPTH)

    # Sketch10 → Cut-Extrude4 (cut)
    with BuildSketch(Plane(origin=(0, 0, 0), x_dir=(-1, 0, 0), z_dir=(0, 0, -1))):
        with Locations((-45, 82.225)):
            Circle(SKETCH10_R)
        with Locations((-20, 82.225)):
            Circle(SKETCH10_R)
        with Locations((5, 82.225)):
            Circle(SKETCH10_R)
    extrude(amount=-CUT_EXTRUDE4_DEPTH, mode=Mode.SUBTRACT)

    # Sketch11 → Cut-Extrude5 (cut, through all)
    with BuildSketch(Plane(origin=(0, 0, 0), x_dir=(-1, 0, 0), z_dir=(0, 0, -1))):
        with Locations((-102.5, 107.225)):
            Circle(SKETCH11_R)
        with Locations(Location((-102.5, 2.775, 0), (0, 0, 180))):
            Circle(SKETCH11_R)
        with Locations((102.5, 2.775)):
            Circle(SKETCH11_R)
        with Locations(Location((102.5, 107.225, 0), (0, 0, 180))):
            Circle(SKETCH11_R)
    extrude(amount=-CUT_EXTRUDE5_DEPTH, mode=Mode.SUBTRACT)

    # Sketch12 → Cut-Extrude6 (cut)
    with BuildSketch(Plane(origin=(0, 177.225, 0), x_dir=(1, 0, 0), z_dir=(0, 1, 0))):
        with Locations(Location((-41.25, -2.5, 0), (0, 0, 270))):
            Circle(SKETCH12_R)
        with Locations(Location((36.25, -2.5, 0), (0, 0, 270))):
            Circle(SKETCH12_R)
    cut_extrude6 = extrude(amount=-CUT_EXTRUDE6_DEPTH, mode=Mode.SUBTRACT)

    # Mirror1: Cut-Extrude6 across plane
    add(cut_extrude6.mirror(Plane.ZX.offset(55)), mode=Mode.SUBTRACT)

    # Sketch13 → Boss-Extrude7 (add)
    with BuildSketch(Plane.ZY.offset(105)):
        with Locations((2.5, 55)):
            Rectangle(SKETCH13_W, SKETCH13_H)
    extrude(amount=BOSS_EXTRUDE7_DEPTH)

    # Sketch14 → Cut-Extrude7 (cut)
    with BuildSketch(Plane(origin=(0, 0, 0), x_dir=(-1, 0, 0), z_dir=(0, 0, -1))):
        with Locations((102.5, 2.775)):
            Circle(SKETCH14_R)
        with Locations(Location((102.5, 107.225, 0), (0, 0, 180))):
            Circle(SKETCH14_R)
        with Locations((107.5, 2.775)):
            Circle(SKETCH14_R)
        with Locations((107.5, 107.225)):
            Circle(SKETCH14_R)
    extrude(amount=-CUT_EXTRUDE7_DEPTH, mode=Mode.SUBTRACT)

    # Sketch15 → Boss-Extrude8 (add)
    with BuildSketch(Plane(origin=(0, 0, 0), x_dir=(-1, 0, 0), z_dir=(0, 0, -1))):
        with Locations((102.5, 2.775)):
            Circle(SKETCH15_R)
        with Locations((102.5, 107.225)):
            Circle(SKETCH15_R)
    extrude(amount=-BOSS_EXTRUDE8_DEPTH)


solid = part.part
